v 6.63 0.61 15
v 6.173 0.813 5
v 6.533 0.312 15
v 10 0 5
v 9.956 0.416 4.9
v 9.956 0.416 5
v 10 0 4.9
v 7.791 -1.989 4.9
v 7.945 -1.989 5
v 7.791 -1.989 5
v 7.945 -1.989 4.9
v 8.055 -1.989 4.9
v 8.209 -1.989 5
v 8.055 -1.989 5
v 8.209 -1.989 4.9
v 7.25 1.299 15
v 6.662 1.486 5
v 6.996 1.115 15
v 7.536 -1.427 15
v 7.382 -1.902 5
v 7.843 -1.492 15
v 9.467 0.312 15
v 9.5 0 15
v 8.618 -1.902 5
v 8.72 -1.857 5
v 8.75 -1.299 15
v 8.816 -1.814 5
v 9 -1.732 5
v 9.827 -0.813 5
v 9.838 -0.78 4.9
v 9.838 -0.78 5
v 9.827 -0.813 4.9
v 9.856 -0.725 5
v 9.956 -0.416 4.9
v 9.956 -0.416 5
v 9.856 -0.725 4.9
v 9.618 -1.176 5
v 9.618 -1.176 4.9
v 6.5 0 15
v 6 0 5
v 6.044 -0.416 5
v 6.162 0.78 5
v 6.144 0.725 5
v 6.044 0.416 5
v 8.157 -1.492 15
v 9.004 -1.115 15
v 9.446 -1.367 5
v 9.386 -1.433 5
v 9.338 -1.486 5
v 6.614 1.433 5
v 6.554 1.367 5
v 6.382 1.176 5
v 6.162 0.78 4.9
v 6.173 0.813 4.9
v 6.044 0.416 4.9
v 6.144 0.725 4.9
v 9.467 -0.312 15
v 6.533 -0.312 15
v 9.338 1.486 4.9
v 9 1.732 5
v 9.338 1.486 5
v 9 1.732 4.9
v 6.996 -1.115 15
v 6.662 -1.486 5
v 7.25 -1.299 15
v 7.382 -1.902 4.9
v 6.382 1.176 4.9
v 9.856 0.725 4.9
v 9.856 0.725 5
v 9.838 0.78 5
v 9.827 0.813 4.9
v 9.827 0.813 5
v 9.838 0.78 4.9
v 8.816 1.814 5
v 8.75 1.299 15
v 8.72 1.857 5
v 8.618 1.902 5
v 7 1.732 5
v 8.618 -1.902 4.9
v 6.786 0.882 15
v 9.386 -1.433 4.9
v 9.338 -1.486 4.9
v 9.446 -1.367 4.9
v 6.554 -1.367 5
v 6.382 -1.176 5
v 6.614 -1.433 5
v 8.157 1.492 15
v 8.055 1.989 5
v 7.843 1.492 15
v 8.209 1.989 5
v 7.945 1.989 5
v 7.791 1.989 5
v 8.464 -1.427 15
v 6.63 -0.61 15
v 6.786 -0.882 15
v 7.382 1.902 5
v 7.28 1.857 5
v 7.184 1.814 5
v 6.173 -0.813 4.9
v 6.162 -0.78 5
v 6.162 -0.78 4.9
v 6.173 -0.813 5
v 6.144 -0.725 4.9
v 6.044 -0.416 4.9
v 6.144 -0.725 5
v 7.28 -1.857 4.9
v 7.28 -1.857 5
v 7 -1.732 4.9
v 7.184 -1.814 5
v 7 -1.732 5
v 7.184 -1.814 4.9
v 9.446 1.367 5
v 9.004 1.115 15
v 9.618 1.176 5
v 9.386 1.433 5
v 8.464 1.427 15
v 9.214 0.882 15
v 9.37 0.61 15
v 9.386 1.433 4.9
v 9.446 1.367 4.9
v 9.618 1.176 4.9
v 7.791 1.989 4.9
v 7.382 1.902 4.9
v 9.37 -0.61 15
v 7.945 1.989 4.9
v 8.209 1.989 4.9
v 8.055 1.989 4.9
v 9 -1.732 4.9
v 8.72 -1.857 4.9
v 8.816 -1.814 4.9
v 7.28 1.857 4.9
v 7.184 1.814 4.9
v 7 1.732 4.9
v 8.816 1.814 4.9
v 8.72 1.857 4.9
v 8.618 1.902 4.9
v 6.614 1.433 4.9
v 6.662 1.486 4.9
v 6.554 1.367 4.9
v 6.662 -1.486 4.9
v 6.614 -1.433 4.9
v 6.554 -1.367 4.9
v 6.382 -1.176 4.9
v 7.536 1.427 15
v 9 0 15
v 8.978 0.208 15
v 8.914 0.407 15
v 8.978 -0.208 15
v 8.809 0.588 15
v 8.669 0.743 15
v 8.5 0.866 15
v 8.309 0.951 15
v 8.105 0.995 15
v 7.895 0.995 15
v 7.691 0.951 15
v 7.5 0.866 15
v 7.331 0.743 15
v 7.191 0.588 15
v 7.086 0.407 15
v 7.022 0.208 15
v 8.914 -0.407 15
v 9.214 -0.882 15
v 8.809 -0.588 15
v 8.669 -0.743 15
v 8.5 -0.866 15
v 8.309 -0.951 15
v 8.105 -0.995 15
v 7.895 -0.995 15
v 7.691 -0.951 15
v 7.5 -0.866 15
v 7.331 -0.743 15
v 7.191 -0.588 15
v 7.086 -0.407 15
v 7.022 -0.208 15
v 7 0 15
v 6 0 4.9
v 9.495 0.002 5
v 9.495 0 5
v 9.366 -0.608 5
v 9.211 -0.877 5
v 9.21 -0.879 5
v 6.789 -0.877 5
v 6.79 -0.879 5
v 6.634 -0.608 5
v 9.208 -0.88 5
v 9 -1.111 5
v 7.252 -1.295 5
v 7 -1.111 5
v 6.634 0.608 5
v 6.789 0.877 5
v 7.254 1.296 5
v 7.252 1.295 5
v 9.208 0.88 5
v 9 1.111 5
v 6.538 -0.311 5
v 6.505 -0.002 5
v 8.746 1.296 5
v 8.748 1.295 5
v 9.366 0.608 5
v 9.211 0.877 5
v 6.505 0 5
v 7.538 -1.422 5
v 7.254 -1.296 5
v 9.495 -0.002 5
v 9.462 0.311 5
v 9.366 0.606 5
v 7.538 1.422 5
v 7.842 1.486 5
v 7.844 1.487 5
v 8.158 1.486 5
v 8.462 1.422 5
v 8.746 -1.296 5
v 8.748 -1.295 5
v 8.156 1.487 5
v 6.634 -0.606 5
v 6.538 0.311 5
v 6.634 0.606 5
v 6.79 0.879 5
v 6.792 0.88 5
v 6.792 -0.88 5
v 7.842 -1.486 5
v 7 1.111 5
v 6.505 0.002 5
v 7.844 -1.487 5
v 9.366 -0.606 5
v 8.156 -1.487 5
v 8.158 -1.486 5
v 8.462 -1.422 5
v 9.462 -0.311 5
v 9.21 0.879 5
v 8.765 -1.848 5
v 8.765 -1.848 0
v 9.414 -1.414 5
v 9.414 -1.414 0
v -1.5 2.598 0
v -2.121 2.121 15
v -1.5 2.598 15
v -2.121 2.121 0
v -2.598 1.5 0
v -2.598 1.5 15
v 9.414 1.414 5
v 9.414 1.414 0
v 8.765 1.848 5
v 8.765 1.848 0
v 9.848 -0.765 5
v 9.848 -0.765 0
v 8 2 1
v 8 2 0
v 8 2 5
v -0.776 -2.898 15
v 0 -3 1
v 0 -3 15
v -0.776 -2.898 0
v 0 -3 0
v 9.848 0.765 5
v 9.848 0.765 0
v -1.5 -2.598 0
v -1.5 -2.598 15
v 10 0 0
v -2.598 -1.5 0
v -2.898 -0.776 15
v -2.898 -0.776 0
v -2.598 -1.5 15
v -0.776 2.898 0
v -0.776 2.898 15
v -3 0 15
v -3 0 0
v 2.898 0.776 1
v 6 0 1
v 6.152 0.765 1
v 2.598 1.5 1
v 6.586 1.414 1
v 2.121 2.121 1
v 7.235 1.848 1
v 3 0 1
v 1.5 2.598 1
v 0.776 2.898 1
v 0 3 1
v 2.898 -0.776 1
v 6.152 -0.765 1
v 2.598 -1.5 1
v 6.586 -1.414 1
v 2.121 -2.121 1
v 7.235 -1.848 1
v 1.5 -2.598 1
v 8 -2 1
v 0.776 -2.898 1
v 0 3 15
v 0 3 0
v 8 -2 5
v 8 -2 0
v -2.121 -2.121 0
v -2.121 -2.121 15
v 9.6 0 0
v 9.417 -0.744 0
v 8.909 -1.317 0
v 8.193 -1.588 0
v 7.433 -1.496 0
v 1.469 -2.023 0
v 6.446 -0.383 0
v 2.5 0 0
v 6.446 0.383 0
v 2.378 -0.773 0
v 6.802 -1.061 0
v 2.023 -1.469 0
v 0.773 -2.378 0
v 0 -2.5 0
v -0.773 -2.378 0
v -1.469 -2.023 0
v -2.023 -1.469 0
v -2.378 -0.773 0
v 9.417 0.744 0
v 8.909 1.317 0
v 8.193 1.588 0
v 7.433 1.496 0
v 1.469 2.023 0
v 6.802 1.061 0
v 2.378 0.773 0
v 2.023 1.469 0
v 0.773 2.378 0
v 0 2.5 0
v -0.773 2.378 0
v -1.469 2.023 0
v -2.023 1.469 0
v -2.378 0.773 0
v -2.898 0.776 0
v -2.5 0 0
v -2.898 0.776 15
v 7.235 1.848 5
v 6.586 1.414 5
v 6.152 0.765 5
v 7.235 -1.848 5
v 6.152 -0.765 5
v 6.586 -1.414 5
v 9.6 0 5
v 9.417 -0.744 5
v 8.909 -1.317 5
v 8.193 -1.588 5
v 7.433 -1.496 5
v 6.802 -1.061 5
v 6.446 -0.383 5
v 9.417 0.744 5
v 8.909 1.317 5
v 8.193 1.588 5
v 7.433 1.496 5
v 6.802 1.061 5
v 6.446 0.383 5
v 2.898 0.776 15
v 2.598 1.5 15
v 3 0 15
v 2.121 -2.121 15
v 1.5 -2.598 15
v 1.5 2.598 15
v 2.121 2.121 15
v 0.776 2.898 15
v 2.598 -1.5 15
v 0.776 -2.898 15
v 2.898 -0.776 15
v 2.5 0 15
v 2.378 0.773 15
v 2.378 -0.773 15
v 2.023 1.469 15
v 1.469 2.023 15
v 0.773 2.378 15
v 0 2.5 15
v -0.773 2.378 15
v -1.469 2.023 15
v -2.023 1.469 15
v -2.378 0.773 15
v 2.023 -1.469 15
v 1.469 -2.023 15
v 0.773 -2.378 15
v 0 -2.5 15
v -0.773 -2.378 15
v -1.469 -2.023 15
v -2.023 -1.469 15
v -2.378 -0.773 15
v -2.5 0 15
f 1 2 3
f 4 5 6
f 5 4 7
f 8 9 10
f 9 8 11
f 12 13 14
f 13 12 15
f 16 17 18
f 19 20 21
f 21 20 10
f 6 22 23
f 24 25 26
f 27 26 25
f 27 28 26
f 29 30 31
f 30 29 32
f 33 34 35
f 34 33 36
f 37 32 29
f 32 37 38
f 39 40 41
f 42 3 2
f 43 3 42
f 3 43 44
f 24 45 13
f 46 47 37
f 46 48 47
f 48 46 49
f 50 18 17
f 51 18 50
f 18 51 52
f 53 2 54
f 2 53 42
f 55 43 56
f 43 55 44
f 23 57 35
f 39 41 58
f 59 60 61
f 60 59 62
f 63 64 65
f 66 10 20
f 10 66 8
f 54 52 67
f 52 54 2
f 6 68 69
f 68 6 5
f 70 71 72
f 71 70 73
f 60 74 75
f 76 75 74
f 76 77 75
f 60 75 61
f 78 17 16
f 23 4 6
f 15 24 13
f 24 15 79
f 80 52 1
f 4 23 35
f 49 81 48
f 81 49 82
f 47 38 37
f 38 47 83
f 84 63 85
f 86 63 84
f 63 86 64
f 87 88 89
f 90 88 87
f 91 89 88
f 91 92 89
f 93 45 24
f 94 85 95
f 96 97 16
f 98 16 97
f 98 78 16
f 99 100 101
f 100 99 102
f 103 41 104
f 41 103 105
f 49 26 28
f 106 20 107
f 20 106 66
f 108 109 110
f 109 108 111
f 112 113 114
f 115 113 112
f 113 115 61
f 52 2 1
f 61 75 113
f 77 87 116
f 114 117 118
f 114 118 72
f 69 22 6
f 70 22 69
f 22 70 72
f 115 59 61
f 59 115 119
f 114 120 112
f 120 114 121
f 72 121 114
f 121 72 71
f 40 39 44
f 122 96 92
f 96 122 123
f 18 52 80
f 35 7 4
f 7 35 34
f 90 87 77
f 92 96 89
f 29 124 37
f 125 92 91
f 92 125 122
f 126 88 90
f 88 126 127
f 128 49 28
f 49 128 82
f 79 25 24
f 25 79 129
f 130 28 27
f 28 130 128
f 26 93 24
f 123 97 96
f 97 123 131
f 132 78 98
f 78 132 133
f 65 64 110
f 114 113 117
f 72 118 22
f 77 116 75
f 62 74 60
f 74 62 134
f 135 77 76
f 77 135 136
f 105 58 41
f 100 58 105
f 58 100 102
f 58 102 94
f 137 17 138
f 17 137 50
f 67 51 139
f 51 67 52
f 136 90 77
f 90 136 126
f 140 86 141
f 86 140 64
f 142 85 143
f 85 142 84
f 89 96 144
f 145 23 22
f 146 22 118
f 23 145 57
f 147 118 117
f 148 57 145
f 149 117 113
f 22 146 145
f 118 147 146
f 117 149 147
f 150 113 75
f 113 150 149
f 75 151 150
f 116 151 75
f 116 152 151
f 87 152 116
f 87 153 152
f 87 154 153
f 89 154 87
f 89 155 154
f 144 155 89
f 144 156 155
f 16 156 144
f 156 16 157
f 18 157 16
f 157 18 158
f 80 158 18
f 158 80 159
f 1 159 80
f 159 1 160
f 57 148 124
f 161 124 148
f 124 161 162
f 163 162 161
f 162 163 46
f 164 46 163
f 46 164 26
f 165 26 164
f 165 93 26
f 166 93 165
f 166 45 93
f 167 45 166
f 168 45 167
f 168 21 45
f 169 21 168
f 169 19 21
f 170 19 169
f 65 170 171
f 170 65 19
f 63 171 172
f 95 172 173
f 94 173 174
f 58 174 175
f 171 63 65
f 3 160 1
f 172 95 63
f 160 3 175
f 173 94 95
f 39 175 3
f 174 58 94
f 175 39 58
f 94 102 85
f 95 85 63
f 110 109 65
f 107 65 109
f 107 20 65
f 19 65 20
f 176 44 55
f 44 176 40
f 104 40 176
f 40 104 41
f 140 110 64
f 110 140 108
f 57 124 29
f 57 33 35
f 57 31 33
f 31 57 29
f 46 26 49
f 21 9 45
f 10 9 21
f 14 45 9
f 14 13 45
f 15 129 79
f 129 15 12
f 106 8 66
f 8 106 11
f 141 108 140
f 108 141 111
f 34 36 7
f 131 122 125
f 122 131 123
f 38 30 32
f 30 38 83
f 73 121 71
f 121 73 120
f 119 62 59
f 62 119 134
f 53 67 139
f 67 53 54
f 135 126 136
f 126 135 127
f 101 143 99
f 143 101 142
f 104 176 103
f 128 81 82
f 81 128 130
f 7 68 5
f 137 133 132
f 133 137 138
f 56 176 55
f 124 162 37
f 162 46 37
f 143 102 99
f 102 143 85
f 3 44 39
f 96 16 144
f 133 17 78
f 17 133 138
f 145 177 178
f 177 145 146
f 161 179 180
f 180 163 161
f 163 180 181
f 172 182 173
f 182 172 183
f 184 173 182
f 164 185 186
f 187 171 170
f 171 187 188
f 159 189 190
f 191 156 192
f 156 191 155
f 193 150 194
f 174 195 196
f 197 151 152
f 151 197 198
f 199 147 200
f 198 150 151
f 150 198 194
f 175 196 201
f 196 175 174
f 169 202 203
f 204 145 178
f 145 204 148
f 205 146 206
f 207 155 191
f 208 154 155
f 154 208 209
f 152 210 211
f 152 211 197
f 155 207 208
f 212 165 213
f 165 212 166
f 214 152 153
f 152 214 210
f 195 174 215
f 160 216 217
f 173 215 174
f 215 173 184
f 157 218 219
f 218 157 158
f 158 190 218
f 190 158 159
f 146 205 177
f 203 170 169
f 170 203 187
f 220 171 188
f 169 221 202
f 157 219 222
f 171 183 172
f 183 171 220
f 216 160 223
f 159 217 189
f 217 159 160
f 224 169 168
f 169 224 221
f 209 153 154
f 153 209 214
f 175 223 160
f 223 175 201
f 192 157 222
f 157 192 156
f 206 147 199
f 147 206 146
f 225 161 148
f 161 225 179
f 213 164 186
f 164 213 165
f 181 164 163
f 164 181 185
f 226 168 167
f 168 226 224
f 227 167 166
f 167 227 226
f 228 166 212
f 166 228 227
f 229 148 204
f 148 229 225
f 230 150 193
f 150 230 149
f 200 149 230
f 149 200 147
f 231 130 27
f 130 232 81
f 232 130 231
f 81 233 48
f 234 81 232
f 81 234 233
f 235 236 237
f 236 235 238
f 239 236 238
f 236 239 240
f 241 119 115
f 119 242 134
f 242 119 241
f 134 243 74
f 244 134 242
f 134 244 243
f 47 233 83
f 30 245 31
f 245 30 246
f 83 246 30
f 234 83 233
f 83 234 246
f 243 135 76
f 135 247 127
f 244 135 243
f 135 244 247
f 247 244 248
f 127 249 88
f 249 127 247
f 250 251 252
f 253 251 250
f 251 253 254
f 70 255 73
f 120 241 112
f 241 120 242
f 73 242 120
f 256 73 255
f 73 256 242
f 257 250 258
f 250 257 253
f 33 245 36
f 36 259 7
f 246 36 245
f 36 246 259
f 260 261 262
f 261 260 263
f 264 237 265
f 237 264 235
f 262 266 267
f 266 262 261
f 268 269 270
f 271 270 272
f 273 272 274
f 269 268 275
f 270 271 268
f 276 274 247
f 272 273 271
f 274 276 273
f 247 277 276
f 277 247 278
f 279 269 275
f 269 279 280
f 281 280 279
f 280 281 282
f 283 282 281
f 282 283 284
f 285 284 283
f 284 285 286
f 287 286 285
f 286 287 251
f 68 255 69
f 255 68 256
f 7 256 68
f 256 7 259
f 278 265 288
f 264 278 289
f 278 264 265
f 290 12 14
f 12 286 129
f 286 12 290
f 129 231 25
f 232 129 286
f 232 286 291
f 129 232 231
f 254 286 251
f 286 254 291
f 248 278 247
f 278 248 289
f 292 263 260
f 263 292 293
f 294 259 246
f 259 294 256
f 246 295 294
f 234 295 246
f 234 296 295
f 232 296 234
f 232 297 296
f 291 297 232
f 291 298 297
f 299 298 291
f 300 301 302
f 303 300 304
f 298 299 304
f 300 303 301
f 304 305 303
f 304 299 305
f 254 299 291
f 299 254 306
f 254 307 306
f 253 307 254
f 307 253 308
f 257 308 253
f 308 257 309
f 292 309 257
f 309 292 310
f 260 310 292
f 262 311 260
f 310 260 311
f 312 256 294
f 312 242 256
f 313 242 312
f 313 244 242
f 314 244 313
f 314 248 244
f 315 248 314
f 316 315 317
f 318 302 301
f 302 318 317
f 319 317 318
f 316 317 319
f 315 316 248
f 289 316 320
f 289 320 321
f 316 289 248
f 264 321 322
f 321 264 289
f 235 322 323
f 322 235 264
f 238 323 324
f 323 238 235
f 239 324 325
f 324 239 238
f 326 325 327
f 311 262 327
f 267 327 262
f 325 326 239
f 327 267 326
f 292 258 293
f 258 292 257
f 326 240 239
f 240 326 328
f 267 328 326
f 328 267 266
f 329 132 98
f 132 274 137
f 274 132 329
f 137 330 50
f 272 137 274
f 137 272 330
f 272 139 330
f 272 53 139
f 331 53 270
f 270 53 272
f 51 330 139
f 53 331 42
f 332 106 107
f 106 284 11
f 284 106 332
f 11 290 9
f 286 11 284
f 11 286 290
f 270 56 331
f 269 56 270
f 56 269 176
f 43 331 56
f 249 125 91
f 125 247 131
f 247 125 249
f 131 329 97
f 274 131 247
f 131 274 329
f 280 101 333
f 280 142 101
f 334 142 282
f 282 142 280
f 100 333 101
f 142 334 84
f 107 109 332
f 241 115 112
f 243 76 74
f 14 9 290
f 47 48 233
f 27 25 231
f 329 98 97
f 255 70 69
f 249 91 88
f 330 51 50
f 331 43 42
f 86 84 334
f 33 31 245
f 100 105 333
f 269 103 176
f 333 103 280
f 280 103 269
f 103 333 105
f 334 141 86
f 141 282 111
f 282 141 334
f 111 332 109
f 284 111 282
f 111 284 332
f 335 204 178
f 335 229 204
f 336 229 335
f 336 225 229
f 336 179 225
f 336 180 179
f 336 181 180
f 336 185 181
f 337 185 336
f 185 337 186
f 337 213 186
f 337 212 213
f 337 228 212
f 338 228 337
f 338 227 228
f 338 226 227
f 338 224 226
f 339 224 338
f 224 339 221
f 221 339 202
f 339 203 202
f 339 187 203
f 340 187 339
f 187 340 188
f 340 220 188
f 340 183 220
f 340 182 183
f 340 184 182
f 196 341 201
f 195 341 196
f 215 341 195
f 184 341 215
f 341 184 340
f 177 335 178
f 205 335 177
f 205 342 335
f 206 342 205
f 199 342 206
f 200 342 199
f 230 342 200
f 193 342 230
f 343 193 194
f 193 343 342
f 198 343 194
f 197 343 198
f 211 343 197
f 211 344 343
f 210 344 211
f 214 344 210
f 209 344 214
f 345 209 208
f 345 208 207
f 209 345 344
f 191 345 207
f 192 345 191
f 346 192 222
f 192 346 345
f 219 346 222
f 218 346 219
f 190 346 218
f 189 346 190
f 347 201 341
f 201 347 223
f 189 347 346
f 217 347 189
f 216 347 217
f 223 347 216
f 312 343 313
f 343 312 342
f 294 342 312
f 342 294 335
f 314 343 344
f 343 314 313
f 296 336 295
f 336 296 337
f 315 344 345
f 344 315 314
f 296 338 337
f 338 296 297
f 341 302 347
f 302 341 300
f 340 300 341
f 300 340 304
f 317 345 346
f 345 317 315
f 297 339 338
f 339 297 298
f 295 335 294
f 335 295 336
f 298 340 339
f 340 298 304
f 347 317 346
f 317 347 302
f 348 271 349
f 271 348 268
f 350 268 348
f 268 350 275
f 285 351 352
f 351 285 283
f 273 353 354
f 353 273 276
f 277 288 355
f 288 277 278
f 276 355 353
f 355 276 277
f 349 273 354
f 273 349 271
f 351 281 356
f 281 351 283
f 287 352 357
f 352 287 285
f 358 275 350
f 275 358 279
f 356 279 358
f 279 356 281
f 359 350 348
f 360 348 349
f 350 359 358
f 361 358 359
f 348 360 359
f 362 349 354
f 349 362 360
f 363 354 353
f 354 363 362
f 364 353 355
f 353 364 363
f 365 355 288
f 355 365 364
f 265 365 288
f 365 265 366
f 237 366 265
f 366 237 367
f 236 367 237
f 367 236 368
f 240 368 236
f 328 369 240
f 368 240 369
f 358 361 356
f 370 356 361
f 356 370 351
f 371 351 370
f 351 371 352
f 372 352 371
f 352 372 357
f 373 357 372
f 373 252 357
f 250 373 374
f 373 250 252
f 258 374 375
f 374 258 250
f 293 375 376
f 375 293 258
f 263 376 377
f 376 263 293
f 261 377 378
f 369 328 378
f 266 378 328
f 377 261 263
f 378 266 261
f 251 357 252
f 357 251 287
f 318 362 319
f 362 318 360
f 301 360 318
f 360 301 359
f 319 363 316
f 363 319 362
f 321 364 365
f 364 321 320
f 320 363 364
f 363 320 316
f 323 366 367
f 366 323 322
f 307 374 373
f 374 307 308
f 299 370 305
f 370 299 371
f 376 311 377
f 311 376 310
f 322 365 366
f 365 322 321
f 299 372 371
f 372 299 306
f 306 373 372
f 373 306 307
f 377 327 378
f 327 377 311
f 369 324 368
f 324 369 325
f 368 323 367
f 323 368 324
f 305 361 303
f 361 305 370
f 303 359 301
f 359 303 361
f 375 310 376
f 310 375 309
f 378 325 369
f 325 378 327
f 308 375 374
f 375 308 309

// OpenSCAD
$fs = 0.8;

module RGB_Led() {
	
	sHeight = 15;
	difference() {
		union() {
			children();
			
			cylinder(d = 6, h = sHeight);
		}
		
		translate([0, 0, -0.1]) cylinder(d = 5, h = sHeight + 1);
	}
}

module IR_Shield() {
	
	sHeight = 10;
	fDiam = 2;
	
	$fs = 0.1;
	
	difference() {
		hull() {
			cylinder(d = 4, h = 0.1);
			translate([0, 0, sHeight]) cylinder(d = fDiam + 1, h = 0.1);
		}
		hull() {
			translate([0, 0, -0.1]) cylinder(d = 3, h = 0.1);
			translate([0, 0, sHeight + 0.001]) cylinder(d = fDiam, h = 0.1);
		}
	}
}

module IR_Led() {
	difference() {
		union() {
			children();
			
			cylinder(d = 4, h = 5);
			
			translate([0, 0, 4.9]) IR_Shield();
		}
	translate([0, 0, -0.1]) cylinder(d = 3.2, h = 5.1001);
	}
}

module IR_Set() {
	RGB_Led()
	translate([8, 0, 0]) IR_Led() translate([-8, 0, 0]) 
	
	hull() {
		cylinder(d = 6, h = 1);
		translate([8, 0, 0]) cylinder(d = 4, h = 1);
	}
}

IR_Set();
